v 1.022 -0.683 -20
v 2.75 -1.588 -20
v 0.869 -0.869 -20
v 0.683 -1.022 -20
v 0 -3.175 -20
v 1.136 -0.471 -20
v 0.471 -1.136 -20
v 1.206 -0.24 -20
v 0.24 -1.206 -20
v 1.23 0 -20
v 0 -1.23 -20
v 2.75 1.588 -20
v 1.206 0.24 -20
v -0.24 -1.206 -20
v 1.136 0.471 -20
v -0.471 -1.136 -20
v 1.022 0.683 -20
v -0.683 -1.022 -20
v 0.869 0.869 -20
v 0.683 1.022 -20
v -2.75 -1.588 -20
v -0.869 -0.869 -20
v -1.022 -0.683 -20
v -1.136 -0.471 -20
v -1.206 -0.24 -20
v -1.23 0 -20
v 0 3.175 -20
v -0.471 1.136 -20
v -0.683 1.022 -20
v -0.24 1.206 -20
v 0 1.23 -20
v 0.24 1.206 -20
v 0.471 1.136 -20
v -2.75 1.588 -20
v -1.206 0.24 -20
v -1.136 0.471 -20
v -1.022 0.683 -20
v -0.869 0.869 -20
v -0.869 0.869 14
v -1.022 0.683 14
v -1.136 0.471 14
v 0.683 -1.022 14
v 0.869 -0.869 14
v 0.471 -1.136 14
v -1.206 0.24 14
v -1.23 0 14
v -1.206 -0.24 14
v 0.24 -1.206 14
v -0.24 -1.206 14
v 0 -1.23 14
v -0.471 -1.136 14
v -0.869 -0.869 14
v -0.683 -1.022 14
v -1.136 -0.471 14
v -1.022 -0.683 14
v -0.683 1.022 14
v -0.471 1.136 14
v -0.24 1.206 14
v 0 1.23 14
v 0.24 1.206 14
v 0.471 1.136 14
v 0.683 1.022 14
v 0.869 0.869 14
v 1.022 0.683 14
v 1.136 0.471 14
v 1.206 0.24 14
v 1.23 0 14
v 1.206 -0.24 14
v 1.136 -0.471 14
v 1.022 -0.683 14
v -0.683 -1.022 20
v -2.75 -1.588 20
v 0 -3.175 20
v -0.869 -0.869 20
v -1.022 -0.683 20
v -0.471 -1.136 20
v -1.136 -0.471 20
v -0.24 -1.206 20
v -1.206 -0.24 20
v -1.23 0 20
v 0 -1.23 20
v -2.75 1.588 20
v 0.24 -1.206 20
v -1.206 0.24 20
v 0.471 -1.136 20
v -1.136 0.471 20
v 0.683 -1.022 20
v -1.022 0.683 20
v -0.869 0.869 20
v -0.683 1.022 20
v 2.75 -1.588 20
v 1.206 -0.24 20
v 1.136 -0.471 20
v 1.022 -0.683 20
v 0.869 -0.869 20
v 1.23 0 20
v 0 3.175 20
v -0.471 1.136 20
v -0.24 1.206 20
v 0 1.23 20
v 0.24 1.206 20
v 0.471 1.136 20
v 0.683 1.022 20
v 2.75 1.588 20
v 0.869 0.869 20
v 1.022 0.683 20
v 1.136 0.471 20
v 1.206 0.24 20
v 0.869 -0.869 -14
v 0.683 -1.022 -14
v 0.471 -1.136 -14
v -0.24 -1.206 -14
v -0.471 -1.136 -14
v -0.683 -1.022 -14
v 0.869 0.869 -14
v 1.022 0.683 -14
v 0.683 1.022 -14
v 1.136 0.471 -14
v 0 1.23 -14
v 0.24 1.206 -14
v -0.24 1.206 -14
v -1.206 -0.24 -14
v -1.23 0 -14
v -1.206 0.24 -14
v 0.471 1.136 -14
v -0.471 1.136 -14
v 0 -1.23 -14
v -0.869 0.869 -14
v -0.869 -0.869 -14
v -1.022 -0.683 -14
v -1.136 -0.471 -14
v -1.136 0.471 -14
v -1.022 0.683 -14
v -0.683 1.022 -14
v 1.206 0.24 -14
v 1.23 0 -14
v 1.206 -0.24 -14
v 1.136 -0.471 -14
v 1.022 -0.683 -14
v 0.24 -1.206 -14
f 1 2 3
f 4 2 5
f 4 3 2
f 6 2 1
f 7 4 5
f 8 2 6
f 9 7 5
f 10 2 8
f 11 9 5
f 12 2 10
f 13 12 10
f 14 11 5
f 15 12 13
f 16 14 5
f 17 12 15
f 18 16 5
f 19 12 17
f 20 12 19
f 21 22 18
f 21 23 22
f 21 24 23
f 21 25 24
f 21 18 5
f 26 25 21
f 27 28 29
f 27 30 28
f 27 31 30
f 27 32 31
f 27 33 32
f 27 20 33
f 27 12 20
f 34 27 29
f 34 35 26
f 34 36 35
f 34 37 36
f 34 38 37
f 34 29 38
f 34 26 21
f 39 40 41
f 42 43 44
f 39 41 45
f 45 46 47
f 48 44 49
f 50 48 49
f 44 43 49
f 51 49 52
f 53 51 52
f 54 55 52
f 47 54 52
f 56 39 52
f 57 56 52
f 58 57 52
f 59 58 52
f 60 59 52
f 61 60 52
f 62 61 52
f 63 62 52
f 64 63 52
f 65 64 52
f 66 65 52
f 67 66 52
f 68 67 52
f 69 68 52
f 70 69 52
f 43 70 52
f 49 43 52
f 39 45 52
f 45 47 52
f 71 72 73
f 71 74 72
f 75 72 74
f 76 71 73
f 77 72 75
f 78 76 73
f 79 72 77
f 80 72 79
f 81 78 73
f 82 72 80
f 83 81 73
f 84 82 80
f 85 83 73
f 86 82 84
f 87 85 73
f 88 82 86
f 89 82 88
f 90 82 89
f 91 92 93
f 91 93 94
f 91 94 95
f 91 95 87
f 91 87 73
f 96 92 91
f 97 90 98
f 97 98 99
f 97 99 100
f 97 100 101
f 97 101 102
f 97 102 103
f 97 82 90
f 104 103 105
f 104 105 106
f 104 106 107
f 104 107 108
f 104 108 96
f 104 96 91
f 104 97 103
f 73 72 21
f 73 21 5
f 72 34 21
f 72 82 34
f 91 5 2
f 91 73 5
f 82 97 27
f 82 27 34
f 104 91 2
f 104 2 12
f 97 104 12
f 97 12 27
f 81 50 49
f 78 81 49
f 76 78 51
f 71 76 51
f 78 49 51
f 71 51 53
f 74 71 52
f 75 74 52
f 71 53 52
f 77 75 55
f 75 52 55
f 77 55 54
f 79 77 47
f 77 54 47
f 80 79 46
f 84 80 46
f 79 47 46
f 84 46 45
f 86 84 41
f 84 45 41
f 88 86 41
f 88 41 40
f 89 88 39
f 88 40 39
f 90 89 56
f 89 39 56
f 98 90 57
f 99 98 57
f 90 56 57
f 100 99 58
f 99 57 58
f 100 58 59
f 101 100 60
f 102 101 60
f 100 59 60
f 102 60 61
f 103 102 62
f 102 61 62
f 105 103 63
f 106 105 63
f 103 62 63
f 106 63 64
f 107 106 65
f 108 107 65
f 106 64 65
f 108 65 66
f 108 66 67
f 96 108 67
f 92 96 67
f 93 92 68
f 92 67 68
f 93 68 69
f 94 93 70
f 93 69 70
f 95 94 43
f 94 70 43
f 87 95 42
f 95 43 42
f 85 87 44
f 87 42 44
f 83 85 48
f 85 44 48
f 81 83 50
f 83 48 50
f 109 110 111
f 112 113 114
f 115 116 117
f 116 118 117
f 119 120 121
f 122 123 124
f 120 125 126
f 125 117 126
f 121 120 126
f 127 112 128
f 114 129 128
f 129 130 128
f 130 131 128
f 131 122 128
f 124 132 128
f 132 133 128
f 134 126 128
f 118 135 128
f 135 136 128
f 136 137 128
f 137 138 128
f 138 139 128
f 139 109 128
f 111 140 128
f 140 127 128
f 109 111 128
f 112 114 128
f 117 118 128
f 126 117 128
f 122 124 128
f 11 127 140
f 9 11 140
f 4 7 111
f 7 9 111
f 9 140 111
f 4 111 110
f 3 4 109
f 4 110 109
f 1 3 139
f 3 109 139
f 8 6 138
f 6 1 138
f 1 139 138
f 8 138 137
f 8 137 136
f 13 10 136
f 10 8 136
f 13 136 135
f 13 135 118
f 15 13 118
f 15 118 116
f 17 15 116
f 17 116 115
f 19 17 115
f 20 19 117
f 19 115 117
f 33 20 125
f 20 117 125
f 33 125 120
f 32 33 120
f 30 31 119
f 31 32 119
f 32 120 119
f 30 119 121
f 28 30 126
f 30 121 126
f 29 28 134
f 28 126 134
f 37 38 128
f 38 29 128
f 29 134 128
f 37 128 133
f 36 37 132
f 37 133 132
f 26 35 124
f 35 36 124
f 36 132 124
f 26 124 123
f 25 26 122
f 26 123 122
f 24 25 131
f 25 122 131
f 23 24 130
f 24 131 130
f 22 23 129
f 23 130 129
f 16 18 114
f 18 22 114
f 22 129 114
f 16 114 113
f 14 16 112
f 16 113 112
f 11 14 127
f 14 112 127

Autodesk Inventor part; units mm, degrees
ref_plane "YZ Plane" through (0, 0, 0) normal (1, 0, 0) x (0, 1, 0)
ref_plane "XZ Plane" through (0, 0, 0) normal (0, 1, 0) x (-1, 0, 0)
ref_plane "XY Plane" through (0, 0, 0) normal (0, 0, 1) x (1, 0, 0)
sketch "スケッチ1" plane through (0, 0, 0) normal (0, 0, 1) x (1, 0, 0)
  line L0 (2.75, 1.5877) -> (2.75, -1.5877)
  line L1 (2.75, -1.5877) -> (0, -3.1754)
  line L2 (0, -3.1754) -> (-2.75, -1.5877)
  line L3 (-2.75, -1.5877) -> (-2.75, 1.5877)
  line L4 (-2.75, 1.5877) -> (0, 3.1754)
  line L5 (0, 3.1754) -> (2.75, 1.5877)
  point P0 (0, 0)
  point P1 (0, 0)
  dimension "d0" = 5.5
extrude "押し出し1" add sketch "スケッチ1" along normal blind 20
sketch "スケッチ2" plane through (0, 0, 20) normal (0, 0, 1) x (1, 0, 0)
  point P0 (0, 0)
  point P1 (0, 0)
hole "穴1" at (0, 0, 20) direction (0, 0, -1) diameter 2.459 depth 6 thread size "M3x0.5" class "6H" standard "ISO Metric profile"
mirror "ミラー1" about plane through (0, 0, 0) normal (0, 0, -1) of "押し出し1", "穴1"
properties part number "ASU-340" material "ステンレス鋼 AISI 304"
